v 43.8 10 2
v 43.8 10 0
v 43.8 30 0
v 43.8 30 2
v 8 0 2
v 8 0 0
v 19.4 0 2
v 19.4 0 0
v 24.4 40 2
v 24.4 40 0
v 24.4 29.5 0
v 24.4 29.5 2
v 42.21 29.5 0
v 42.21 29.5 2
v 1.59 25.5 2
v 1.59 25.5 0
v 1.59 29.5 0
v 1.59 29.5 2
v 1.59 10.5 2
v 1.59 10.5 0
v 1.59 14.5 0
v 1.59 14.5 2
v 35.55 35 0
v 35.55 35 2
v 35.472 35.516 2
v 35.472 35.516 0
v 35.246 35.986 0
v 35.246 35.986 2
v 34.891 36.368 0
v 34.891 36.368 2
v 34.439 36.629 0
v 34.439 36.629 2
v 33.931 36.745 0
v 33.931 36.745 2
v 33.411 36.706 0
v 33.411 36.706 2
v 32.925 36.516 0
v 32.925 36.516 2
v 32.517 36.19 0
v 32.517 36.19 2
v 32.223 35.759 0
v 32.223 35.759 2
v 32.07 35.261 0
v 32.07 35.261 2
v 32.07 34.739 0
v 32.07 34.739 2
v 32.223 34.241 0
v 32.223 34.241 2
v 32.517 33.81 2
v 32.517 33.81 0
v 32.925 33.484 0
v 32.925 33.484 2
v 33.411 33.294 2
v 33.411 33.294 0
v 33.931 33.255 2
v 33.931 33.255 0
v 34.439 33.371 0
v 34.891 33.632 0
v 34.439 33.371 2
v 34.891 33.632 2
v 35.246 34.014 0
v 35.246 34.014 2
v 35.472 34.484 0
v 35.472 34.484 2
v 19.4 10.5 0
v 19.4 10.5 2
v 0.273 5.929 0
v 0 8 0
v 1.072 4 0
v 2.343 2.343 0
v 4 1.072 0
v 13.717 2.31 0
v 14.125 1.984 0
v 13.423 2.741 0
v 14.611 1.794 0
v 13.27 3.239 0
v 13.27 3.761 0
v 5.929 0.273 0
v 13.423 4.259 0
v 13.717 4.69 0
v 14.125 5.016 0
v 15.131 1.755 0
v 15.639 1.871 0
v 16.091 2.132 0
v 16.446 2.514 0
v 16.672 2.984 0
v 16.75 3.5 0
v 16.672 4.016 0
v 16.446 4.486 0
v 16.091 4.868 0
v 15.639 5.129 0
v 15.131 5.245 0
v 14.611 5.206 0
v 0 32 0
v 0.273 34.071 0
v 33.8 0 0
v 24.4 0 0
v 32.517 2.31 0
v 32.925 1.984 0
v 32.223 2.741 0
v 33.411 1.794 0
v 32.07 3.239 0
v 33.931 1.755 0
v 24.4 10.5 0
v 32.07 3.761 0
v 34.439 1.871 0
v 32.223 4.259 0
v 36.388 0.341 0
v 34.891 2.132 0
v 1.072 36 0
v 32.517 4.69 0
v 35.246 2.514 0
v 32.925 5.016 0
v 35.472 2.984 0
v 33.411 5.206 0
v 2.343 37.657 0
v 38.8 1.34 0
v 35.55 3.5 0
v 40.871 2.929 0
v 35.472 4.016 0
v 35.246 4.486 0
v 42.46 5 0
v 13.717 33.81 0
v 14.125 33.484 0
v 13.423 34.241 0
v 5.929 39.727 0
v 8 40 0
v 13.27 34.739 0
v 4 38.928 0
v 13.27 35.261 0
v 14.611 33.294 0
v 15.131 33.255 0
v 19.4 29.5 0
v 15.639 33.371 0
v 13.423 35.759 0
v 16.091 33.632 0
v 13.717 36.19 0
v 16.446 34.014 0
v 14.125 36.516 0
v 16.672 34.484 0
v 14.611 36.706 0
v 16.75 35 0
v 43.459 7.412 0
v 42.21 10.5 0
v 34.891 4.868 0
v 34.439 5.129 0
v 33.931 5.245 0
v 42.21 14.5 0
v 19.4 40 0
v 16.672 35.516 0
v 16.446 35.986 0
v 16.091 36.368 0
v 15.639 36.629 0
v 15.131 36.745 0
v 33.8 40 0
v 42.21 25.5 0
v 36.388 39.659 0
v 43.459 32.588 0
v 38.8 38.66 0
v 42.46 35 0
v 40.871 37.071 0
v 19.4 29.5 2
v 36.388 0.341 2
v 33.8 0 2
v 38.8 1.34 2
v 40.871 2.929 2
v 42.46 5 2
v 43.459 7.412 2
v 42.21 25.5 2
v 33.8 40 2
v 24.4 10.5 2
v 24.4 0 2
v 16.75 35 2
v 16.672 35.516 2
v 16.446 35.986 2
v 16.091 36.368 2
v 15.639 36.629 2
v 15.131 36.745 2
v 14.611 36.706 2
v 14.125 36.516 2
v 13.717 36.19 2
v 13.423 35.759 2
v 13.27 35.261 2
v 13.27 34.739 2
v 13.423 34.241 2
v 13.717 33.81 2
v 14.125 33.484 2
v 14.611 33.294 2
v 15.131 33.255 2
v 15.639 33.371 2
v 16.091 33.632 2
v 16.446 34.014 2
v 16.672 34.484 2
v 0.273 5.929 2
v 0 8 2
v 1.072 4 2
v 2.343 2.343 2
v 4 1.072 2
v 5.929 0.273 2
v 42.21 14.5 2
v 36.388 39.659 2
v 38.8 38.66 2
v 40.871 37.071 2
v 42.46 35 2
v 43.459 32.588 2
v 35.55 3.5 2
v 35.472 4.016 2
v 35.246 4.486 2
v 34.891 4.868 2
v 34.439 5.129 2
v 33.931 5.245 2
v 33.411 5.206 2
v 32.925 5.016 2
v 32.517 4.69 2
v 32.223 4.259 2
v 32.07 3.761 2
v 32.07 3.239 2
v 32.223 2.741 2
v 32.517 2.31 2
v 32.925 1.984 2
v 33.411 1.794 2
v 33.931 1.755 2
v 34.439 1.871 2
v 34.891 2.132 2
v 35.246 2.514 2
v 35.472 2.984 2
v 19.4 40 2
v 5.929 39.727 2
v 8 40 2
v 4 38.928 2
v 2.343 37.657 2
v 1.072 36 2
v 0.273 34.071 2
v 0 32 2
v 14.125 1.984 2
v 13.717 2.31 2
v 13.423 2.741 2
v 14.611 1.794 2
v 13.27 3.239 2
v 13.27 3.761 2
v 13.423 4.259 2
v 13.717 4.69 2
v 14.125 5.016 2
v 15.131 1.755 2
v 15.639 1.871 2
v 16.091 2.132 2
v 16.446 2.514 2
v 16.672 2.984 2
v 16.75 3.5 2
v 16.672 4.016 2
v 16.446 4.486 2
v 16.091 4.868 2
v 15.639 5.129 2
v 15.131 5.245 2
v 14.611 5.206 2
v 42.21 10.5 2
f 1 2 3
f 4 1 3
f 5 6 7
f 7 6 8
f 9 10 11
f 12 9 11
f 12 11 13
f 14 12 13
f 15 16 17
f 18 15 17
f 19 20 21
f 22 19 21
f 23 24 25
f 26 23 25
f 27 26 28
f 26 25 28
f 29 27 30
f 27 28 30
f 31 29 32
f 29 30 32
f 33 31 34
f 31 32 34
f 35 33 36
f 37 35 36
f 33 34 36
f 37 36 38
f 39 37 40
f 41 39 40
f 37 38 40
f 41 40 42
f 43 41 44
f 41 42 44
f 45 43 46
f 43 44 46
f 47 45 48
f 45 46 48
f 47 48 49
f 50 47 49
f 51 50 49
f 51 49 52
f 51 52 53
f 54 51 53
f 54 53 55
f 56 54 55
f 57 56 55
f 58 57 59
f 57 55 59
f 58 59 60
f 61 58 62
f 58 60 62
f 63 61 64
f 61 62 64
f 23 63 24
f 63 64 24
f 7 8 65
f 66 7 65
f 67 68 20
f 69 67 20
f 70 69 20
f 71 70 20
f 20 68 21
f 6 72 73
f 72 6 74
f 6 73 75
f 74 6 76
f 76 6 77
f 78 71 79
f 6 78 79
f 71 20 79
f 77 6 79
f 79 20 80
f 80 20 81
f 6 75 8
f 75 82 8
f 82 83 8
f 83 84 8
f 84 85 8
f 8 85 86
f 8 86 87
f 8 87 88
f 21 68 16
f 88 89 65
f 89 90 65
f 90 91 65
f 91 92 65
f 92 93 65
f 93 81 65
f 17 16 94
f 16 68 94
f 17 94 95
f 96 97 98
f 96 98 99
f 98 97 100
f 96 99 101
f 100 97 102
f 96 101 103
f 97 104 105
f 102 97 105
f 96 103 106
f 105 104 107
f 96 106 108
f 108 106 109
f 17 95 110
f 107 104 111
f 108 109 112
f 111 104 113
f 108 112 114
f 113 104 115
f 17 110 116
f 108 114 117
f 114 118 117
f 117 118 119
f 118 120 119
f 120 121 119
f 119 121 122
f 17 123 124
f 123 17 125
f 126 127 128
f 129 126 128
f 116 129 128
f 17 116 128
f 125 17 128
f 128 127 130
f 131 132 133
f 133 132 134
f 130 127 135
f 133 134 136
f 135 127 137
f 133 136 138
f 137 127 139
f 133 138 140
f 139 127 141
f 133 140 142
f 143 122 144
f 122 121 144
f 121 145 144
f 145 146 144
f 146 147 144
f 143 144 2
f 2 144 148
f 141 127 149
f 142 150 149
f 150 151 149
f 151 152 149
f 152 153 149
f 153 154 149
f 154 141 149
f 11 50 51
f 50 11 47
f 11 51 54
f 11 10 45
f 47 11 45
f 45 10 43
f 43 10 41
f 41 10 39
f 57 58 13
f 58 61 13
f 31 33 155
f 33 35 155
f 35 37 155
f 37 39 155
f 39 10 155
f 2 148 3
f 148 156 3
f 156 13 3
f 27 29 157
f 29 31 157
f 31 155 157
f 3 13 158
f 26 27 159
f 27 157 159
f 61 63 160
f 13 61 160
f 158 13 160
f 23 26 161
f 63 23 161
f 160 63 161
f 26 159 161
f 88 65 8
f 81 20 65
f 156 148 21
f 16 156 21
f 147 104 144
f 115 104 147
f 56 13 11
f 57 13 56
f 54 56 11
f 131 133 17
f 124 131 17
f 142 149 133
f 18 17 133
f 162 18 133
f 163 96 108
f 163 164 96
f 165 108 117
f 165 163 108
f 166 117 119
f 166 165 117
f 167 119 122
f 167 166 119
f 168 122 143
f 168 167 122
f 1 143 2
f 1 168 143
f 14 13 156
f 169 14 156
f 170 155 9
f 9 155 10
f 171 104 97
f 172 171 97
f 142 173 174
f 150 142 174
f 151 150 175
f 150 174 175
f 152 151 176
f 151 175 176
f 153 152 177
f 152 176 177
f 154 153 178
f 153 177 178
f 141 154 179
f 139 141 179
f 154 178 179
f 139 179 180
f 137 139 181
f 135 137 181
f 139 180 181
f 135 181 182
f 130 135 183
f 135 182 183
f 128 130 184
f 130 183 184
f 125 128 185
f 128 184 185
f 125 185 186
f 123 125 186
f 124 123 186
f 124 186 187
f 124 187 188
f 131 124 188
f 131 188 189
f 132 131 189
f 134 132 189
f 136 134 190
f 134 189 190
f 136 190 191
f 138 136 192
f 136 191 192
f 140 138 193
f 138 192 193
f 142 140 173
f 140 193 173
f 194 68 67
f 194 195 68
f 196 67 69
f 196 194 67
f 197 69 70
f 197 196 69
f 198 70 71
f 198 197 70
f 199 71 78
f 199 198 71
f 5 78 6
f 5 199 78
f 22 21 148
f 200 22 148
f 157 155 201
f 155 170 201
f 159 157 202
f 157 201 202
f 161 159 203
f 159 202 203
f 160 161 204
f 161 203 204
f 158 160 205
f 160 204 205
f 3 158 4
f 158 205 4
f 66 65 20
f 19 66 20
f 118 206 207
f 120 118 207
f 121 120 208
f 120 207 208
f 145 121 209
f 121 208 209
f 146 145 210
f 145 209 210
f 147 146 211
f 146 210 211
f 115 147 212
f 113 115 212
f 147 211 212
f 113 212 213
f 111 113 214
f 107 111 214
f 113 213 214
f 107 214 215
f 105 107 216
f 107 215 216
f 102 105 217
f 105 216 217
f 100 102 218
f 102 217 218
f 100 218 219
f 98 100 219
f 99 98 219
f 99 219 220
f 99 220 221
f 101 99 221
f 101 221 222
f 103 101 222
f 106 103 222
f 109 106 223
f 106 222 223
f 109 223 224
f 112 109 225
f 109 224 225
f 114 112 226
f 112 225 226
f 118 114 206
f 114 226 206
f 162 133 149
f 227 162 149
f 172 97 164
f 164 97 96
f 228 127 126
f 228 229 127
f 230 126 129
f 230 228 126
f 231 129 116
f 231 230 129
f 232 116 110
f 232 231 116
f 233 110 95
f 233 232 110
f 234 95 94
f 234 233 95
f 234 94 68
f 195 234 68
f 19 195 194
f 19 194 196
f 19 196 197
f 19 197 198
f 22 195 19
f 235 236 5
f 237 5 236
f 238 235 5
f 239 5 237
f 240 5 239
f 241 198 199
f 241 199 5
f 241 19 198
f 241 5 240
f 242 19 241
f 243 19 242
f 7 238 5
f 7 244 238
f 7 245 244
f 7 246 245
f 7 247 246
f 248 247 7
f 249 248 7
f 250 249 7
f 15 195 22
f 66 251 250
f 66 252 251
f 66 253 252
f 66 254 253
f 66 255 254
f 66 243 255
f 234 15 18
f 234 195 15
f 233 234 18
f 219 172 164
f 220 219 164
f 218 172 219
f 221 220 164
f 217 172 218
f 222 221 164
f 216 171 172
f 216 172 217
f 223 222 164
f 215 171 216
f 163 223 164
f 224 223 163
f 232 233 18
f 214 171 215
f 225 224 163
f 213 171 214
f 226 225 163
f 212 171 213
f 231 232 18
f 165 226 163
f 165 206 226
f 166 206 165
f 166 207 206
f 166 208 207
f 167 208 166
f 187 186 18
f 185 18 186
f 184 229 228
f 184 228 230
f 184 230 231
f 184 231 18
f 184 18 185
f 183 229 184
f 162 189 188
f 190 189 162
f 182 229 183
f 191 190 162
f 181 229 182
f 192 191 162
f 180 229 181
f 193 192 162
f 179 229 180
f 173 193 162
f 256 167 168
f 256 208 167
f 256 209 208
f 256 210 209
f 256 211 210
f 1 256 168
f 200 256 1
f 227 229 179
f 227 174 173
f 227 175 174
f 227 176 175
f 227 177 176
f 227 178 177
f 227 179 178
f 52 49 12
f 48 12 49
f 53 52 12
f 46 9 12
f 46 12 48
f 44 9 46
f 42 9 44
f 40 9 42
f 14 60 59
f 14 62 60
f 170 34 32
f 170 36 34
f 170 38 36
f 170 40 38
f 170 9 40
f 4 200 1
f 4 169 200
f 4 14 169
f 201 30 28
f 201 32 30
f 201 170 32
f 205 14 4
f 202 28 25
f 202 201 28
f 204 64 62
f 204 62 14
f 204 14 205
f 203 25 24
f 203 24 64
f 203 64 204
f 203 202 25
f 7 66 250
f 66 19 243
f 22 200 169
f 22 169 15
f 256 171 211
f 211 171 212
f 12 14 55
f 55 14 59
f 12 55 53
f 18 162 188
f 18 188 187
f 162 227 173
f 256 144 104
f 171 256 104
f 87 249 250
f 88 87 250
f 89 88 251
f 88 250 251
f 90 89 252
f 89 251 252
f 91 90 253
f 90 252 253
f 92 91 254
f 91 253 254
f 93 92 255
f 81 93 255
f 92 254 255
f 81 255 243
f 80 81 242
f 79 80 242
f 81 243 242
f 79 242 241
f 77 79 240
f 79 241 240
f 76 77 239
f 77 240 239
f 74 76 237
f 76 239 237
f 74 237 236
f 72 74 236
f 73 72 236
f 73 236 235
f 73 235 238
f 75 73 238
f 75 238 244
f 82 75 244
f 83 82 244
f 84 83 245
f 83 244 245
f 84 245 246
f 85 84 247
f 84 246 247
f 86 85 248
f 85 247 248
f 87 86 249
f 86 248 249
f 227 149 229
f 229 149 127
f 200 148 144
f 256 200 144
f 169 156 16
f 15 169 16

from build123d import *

# Parameters (mm, degrees)
SALIENTE_EXTRUIR1_DEPTH = 2
CROQUIS4_R              = 1.75
CORTAR_EXTRUIR1_DEPTH   = 2
REDONDEO1_R             = 10
REDONDEO2_R             = 8


with BuildPart() as part:
    # Croquis2 → Saliente-Extruir1 (new body)
    with BuildSketch(Plane.XY):
        Polygon((0, 40), (0, 0), (19.4, 0), (19.4, 10.5), (1.59, 10.5), (1.59, 14.5), (42.21, 14.5), (42.21, 10.5), (24.4, 10.5), (24.4, 0), (43.8, 0), (43.8, 40), (24.4, 40), (24.4, 29.5), (42.21, 29.5), (42.21, 25.5), (1.59, 25.5), (1.59, 29.5), (19.4, 29.5), (19.4, 40), align=None)
    extrude(amount=SALIENTE_EXTRUIR1_DEPTH)

    # Croquis4 → Cortar-Extruir1 (cut)
    with BuildSketch(Plane.XY.offset(2)):
        with Locations((15, 35)):
            Circle(CROQUIS4_R)
        with Locations((15, 3.5)):
            Circle(CROQUIS4_R)
        with Locations((33.8, 35)):
            Circle(CROQUIS4_R)
        with Locations((33.8, 3.5)):
            Circle(CROQUIS4_R)
    extrude(amount=-CORTAR_EXTRUIR1_DEPTH, mode=Mode.SUBTRACT)

    # Redondeo1
    redondeo1_edges = [part.edges().sort_by_distance(p)[0] for p in [
        (43.8, 40, 1),
        (43.8, 0, 1),
    ]]
    fillet(redondeo1_edges, radius=REDONDEO1_R)

    # Redondeo2
    redondeo2_edges = [part.edges().sort_by_distance(p)[0] for p in [
        (0, 0, 1),
        (0, 40, 1),
    ]]
    fillet(redondeo2_edges, radius=REDONDEO2_R)


solid = part.part
